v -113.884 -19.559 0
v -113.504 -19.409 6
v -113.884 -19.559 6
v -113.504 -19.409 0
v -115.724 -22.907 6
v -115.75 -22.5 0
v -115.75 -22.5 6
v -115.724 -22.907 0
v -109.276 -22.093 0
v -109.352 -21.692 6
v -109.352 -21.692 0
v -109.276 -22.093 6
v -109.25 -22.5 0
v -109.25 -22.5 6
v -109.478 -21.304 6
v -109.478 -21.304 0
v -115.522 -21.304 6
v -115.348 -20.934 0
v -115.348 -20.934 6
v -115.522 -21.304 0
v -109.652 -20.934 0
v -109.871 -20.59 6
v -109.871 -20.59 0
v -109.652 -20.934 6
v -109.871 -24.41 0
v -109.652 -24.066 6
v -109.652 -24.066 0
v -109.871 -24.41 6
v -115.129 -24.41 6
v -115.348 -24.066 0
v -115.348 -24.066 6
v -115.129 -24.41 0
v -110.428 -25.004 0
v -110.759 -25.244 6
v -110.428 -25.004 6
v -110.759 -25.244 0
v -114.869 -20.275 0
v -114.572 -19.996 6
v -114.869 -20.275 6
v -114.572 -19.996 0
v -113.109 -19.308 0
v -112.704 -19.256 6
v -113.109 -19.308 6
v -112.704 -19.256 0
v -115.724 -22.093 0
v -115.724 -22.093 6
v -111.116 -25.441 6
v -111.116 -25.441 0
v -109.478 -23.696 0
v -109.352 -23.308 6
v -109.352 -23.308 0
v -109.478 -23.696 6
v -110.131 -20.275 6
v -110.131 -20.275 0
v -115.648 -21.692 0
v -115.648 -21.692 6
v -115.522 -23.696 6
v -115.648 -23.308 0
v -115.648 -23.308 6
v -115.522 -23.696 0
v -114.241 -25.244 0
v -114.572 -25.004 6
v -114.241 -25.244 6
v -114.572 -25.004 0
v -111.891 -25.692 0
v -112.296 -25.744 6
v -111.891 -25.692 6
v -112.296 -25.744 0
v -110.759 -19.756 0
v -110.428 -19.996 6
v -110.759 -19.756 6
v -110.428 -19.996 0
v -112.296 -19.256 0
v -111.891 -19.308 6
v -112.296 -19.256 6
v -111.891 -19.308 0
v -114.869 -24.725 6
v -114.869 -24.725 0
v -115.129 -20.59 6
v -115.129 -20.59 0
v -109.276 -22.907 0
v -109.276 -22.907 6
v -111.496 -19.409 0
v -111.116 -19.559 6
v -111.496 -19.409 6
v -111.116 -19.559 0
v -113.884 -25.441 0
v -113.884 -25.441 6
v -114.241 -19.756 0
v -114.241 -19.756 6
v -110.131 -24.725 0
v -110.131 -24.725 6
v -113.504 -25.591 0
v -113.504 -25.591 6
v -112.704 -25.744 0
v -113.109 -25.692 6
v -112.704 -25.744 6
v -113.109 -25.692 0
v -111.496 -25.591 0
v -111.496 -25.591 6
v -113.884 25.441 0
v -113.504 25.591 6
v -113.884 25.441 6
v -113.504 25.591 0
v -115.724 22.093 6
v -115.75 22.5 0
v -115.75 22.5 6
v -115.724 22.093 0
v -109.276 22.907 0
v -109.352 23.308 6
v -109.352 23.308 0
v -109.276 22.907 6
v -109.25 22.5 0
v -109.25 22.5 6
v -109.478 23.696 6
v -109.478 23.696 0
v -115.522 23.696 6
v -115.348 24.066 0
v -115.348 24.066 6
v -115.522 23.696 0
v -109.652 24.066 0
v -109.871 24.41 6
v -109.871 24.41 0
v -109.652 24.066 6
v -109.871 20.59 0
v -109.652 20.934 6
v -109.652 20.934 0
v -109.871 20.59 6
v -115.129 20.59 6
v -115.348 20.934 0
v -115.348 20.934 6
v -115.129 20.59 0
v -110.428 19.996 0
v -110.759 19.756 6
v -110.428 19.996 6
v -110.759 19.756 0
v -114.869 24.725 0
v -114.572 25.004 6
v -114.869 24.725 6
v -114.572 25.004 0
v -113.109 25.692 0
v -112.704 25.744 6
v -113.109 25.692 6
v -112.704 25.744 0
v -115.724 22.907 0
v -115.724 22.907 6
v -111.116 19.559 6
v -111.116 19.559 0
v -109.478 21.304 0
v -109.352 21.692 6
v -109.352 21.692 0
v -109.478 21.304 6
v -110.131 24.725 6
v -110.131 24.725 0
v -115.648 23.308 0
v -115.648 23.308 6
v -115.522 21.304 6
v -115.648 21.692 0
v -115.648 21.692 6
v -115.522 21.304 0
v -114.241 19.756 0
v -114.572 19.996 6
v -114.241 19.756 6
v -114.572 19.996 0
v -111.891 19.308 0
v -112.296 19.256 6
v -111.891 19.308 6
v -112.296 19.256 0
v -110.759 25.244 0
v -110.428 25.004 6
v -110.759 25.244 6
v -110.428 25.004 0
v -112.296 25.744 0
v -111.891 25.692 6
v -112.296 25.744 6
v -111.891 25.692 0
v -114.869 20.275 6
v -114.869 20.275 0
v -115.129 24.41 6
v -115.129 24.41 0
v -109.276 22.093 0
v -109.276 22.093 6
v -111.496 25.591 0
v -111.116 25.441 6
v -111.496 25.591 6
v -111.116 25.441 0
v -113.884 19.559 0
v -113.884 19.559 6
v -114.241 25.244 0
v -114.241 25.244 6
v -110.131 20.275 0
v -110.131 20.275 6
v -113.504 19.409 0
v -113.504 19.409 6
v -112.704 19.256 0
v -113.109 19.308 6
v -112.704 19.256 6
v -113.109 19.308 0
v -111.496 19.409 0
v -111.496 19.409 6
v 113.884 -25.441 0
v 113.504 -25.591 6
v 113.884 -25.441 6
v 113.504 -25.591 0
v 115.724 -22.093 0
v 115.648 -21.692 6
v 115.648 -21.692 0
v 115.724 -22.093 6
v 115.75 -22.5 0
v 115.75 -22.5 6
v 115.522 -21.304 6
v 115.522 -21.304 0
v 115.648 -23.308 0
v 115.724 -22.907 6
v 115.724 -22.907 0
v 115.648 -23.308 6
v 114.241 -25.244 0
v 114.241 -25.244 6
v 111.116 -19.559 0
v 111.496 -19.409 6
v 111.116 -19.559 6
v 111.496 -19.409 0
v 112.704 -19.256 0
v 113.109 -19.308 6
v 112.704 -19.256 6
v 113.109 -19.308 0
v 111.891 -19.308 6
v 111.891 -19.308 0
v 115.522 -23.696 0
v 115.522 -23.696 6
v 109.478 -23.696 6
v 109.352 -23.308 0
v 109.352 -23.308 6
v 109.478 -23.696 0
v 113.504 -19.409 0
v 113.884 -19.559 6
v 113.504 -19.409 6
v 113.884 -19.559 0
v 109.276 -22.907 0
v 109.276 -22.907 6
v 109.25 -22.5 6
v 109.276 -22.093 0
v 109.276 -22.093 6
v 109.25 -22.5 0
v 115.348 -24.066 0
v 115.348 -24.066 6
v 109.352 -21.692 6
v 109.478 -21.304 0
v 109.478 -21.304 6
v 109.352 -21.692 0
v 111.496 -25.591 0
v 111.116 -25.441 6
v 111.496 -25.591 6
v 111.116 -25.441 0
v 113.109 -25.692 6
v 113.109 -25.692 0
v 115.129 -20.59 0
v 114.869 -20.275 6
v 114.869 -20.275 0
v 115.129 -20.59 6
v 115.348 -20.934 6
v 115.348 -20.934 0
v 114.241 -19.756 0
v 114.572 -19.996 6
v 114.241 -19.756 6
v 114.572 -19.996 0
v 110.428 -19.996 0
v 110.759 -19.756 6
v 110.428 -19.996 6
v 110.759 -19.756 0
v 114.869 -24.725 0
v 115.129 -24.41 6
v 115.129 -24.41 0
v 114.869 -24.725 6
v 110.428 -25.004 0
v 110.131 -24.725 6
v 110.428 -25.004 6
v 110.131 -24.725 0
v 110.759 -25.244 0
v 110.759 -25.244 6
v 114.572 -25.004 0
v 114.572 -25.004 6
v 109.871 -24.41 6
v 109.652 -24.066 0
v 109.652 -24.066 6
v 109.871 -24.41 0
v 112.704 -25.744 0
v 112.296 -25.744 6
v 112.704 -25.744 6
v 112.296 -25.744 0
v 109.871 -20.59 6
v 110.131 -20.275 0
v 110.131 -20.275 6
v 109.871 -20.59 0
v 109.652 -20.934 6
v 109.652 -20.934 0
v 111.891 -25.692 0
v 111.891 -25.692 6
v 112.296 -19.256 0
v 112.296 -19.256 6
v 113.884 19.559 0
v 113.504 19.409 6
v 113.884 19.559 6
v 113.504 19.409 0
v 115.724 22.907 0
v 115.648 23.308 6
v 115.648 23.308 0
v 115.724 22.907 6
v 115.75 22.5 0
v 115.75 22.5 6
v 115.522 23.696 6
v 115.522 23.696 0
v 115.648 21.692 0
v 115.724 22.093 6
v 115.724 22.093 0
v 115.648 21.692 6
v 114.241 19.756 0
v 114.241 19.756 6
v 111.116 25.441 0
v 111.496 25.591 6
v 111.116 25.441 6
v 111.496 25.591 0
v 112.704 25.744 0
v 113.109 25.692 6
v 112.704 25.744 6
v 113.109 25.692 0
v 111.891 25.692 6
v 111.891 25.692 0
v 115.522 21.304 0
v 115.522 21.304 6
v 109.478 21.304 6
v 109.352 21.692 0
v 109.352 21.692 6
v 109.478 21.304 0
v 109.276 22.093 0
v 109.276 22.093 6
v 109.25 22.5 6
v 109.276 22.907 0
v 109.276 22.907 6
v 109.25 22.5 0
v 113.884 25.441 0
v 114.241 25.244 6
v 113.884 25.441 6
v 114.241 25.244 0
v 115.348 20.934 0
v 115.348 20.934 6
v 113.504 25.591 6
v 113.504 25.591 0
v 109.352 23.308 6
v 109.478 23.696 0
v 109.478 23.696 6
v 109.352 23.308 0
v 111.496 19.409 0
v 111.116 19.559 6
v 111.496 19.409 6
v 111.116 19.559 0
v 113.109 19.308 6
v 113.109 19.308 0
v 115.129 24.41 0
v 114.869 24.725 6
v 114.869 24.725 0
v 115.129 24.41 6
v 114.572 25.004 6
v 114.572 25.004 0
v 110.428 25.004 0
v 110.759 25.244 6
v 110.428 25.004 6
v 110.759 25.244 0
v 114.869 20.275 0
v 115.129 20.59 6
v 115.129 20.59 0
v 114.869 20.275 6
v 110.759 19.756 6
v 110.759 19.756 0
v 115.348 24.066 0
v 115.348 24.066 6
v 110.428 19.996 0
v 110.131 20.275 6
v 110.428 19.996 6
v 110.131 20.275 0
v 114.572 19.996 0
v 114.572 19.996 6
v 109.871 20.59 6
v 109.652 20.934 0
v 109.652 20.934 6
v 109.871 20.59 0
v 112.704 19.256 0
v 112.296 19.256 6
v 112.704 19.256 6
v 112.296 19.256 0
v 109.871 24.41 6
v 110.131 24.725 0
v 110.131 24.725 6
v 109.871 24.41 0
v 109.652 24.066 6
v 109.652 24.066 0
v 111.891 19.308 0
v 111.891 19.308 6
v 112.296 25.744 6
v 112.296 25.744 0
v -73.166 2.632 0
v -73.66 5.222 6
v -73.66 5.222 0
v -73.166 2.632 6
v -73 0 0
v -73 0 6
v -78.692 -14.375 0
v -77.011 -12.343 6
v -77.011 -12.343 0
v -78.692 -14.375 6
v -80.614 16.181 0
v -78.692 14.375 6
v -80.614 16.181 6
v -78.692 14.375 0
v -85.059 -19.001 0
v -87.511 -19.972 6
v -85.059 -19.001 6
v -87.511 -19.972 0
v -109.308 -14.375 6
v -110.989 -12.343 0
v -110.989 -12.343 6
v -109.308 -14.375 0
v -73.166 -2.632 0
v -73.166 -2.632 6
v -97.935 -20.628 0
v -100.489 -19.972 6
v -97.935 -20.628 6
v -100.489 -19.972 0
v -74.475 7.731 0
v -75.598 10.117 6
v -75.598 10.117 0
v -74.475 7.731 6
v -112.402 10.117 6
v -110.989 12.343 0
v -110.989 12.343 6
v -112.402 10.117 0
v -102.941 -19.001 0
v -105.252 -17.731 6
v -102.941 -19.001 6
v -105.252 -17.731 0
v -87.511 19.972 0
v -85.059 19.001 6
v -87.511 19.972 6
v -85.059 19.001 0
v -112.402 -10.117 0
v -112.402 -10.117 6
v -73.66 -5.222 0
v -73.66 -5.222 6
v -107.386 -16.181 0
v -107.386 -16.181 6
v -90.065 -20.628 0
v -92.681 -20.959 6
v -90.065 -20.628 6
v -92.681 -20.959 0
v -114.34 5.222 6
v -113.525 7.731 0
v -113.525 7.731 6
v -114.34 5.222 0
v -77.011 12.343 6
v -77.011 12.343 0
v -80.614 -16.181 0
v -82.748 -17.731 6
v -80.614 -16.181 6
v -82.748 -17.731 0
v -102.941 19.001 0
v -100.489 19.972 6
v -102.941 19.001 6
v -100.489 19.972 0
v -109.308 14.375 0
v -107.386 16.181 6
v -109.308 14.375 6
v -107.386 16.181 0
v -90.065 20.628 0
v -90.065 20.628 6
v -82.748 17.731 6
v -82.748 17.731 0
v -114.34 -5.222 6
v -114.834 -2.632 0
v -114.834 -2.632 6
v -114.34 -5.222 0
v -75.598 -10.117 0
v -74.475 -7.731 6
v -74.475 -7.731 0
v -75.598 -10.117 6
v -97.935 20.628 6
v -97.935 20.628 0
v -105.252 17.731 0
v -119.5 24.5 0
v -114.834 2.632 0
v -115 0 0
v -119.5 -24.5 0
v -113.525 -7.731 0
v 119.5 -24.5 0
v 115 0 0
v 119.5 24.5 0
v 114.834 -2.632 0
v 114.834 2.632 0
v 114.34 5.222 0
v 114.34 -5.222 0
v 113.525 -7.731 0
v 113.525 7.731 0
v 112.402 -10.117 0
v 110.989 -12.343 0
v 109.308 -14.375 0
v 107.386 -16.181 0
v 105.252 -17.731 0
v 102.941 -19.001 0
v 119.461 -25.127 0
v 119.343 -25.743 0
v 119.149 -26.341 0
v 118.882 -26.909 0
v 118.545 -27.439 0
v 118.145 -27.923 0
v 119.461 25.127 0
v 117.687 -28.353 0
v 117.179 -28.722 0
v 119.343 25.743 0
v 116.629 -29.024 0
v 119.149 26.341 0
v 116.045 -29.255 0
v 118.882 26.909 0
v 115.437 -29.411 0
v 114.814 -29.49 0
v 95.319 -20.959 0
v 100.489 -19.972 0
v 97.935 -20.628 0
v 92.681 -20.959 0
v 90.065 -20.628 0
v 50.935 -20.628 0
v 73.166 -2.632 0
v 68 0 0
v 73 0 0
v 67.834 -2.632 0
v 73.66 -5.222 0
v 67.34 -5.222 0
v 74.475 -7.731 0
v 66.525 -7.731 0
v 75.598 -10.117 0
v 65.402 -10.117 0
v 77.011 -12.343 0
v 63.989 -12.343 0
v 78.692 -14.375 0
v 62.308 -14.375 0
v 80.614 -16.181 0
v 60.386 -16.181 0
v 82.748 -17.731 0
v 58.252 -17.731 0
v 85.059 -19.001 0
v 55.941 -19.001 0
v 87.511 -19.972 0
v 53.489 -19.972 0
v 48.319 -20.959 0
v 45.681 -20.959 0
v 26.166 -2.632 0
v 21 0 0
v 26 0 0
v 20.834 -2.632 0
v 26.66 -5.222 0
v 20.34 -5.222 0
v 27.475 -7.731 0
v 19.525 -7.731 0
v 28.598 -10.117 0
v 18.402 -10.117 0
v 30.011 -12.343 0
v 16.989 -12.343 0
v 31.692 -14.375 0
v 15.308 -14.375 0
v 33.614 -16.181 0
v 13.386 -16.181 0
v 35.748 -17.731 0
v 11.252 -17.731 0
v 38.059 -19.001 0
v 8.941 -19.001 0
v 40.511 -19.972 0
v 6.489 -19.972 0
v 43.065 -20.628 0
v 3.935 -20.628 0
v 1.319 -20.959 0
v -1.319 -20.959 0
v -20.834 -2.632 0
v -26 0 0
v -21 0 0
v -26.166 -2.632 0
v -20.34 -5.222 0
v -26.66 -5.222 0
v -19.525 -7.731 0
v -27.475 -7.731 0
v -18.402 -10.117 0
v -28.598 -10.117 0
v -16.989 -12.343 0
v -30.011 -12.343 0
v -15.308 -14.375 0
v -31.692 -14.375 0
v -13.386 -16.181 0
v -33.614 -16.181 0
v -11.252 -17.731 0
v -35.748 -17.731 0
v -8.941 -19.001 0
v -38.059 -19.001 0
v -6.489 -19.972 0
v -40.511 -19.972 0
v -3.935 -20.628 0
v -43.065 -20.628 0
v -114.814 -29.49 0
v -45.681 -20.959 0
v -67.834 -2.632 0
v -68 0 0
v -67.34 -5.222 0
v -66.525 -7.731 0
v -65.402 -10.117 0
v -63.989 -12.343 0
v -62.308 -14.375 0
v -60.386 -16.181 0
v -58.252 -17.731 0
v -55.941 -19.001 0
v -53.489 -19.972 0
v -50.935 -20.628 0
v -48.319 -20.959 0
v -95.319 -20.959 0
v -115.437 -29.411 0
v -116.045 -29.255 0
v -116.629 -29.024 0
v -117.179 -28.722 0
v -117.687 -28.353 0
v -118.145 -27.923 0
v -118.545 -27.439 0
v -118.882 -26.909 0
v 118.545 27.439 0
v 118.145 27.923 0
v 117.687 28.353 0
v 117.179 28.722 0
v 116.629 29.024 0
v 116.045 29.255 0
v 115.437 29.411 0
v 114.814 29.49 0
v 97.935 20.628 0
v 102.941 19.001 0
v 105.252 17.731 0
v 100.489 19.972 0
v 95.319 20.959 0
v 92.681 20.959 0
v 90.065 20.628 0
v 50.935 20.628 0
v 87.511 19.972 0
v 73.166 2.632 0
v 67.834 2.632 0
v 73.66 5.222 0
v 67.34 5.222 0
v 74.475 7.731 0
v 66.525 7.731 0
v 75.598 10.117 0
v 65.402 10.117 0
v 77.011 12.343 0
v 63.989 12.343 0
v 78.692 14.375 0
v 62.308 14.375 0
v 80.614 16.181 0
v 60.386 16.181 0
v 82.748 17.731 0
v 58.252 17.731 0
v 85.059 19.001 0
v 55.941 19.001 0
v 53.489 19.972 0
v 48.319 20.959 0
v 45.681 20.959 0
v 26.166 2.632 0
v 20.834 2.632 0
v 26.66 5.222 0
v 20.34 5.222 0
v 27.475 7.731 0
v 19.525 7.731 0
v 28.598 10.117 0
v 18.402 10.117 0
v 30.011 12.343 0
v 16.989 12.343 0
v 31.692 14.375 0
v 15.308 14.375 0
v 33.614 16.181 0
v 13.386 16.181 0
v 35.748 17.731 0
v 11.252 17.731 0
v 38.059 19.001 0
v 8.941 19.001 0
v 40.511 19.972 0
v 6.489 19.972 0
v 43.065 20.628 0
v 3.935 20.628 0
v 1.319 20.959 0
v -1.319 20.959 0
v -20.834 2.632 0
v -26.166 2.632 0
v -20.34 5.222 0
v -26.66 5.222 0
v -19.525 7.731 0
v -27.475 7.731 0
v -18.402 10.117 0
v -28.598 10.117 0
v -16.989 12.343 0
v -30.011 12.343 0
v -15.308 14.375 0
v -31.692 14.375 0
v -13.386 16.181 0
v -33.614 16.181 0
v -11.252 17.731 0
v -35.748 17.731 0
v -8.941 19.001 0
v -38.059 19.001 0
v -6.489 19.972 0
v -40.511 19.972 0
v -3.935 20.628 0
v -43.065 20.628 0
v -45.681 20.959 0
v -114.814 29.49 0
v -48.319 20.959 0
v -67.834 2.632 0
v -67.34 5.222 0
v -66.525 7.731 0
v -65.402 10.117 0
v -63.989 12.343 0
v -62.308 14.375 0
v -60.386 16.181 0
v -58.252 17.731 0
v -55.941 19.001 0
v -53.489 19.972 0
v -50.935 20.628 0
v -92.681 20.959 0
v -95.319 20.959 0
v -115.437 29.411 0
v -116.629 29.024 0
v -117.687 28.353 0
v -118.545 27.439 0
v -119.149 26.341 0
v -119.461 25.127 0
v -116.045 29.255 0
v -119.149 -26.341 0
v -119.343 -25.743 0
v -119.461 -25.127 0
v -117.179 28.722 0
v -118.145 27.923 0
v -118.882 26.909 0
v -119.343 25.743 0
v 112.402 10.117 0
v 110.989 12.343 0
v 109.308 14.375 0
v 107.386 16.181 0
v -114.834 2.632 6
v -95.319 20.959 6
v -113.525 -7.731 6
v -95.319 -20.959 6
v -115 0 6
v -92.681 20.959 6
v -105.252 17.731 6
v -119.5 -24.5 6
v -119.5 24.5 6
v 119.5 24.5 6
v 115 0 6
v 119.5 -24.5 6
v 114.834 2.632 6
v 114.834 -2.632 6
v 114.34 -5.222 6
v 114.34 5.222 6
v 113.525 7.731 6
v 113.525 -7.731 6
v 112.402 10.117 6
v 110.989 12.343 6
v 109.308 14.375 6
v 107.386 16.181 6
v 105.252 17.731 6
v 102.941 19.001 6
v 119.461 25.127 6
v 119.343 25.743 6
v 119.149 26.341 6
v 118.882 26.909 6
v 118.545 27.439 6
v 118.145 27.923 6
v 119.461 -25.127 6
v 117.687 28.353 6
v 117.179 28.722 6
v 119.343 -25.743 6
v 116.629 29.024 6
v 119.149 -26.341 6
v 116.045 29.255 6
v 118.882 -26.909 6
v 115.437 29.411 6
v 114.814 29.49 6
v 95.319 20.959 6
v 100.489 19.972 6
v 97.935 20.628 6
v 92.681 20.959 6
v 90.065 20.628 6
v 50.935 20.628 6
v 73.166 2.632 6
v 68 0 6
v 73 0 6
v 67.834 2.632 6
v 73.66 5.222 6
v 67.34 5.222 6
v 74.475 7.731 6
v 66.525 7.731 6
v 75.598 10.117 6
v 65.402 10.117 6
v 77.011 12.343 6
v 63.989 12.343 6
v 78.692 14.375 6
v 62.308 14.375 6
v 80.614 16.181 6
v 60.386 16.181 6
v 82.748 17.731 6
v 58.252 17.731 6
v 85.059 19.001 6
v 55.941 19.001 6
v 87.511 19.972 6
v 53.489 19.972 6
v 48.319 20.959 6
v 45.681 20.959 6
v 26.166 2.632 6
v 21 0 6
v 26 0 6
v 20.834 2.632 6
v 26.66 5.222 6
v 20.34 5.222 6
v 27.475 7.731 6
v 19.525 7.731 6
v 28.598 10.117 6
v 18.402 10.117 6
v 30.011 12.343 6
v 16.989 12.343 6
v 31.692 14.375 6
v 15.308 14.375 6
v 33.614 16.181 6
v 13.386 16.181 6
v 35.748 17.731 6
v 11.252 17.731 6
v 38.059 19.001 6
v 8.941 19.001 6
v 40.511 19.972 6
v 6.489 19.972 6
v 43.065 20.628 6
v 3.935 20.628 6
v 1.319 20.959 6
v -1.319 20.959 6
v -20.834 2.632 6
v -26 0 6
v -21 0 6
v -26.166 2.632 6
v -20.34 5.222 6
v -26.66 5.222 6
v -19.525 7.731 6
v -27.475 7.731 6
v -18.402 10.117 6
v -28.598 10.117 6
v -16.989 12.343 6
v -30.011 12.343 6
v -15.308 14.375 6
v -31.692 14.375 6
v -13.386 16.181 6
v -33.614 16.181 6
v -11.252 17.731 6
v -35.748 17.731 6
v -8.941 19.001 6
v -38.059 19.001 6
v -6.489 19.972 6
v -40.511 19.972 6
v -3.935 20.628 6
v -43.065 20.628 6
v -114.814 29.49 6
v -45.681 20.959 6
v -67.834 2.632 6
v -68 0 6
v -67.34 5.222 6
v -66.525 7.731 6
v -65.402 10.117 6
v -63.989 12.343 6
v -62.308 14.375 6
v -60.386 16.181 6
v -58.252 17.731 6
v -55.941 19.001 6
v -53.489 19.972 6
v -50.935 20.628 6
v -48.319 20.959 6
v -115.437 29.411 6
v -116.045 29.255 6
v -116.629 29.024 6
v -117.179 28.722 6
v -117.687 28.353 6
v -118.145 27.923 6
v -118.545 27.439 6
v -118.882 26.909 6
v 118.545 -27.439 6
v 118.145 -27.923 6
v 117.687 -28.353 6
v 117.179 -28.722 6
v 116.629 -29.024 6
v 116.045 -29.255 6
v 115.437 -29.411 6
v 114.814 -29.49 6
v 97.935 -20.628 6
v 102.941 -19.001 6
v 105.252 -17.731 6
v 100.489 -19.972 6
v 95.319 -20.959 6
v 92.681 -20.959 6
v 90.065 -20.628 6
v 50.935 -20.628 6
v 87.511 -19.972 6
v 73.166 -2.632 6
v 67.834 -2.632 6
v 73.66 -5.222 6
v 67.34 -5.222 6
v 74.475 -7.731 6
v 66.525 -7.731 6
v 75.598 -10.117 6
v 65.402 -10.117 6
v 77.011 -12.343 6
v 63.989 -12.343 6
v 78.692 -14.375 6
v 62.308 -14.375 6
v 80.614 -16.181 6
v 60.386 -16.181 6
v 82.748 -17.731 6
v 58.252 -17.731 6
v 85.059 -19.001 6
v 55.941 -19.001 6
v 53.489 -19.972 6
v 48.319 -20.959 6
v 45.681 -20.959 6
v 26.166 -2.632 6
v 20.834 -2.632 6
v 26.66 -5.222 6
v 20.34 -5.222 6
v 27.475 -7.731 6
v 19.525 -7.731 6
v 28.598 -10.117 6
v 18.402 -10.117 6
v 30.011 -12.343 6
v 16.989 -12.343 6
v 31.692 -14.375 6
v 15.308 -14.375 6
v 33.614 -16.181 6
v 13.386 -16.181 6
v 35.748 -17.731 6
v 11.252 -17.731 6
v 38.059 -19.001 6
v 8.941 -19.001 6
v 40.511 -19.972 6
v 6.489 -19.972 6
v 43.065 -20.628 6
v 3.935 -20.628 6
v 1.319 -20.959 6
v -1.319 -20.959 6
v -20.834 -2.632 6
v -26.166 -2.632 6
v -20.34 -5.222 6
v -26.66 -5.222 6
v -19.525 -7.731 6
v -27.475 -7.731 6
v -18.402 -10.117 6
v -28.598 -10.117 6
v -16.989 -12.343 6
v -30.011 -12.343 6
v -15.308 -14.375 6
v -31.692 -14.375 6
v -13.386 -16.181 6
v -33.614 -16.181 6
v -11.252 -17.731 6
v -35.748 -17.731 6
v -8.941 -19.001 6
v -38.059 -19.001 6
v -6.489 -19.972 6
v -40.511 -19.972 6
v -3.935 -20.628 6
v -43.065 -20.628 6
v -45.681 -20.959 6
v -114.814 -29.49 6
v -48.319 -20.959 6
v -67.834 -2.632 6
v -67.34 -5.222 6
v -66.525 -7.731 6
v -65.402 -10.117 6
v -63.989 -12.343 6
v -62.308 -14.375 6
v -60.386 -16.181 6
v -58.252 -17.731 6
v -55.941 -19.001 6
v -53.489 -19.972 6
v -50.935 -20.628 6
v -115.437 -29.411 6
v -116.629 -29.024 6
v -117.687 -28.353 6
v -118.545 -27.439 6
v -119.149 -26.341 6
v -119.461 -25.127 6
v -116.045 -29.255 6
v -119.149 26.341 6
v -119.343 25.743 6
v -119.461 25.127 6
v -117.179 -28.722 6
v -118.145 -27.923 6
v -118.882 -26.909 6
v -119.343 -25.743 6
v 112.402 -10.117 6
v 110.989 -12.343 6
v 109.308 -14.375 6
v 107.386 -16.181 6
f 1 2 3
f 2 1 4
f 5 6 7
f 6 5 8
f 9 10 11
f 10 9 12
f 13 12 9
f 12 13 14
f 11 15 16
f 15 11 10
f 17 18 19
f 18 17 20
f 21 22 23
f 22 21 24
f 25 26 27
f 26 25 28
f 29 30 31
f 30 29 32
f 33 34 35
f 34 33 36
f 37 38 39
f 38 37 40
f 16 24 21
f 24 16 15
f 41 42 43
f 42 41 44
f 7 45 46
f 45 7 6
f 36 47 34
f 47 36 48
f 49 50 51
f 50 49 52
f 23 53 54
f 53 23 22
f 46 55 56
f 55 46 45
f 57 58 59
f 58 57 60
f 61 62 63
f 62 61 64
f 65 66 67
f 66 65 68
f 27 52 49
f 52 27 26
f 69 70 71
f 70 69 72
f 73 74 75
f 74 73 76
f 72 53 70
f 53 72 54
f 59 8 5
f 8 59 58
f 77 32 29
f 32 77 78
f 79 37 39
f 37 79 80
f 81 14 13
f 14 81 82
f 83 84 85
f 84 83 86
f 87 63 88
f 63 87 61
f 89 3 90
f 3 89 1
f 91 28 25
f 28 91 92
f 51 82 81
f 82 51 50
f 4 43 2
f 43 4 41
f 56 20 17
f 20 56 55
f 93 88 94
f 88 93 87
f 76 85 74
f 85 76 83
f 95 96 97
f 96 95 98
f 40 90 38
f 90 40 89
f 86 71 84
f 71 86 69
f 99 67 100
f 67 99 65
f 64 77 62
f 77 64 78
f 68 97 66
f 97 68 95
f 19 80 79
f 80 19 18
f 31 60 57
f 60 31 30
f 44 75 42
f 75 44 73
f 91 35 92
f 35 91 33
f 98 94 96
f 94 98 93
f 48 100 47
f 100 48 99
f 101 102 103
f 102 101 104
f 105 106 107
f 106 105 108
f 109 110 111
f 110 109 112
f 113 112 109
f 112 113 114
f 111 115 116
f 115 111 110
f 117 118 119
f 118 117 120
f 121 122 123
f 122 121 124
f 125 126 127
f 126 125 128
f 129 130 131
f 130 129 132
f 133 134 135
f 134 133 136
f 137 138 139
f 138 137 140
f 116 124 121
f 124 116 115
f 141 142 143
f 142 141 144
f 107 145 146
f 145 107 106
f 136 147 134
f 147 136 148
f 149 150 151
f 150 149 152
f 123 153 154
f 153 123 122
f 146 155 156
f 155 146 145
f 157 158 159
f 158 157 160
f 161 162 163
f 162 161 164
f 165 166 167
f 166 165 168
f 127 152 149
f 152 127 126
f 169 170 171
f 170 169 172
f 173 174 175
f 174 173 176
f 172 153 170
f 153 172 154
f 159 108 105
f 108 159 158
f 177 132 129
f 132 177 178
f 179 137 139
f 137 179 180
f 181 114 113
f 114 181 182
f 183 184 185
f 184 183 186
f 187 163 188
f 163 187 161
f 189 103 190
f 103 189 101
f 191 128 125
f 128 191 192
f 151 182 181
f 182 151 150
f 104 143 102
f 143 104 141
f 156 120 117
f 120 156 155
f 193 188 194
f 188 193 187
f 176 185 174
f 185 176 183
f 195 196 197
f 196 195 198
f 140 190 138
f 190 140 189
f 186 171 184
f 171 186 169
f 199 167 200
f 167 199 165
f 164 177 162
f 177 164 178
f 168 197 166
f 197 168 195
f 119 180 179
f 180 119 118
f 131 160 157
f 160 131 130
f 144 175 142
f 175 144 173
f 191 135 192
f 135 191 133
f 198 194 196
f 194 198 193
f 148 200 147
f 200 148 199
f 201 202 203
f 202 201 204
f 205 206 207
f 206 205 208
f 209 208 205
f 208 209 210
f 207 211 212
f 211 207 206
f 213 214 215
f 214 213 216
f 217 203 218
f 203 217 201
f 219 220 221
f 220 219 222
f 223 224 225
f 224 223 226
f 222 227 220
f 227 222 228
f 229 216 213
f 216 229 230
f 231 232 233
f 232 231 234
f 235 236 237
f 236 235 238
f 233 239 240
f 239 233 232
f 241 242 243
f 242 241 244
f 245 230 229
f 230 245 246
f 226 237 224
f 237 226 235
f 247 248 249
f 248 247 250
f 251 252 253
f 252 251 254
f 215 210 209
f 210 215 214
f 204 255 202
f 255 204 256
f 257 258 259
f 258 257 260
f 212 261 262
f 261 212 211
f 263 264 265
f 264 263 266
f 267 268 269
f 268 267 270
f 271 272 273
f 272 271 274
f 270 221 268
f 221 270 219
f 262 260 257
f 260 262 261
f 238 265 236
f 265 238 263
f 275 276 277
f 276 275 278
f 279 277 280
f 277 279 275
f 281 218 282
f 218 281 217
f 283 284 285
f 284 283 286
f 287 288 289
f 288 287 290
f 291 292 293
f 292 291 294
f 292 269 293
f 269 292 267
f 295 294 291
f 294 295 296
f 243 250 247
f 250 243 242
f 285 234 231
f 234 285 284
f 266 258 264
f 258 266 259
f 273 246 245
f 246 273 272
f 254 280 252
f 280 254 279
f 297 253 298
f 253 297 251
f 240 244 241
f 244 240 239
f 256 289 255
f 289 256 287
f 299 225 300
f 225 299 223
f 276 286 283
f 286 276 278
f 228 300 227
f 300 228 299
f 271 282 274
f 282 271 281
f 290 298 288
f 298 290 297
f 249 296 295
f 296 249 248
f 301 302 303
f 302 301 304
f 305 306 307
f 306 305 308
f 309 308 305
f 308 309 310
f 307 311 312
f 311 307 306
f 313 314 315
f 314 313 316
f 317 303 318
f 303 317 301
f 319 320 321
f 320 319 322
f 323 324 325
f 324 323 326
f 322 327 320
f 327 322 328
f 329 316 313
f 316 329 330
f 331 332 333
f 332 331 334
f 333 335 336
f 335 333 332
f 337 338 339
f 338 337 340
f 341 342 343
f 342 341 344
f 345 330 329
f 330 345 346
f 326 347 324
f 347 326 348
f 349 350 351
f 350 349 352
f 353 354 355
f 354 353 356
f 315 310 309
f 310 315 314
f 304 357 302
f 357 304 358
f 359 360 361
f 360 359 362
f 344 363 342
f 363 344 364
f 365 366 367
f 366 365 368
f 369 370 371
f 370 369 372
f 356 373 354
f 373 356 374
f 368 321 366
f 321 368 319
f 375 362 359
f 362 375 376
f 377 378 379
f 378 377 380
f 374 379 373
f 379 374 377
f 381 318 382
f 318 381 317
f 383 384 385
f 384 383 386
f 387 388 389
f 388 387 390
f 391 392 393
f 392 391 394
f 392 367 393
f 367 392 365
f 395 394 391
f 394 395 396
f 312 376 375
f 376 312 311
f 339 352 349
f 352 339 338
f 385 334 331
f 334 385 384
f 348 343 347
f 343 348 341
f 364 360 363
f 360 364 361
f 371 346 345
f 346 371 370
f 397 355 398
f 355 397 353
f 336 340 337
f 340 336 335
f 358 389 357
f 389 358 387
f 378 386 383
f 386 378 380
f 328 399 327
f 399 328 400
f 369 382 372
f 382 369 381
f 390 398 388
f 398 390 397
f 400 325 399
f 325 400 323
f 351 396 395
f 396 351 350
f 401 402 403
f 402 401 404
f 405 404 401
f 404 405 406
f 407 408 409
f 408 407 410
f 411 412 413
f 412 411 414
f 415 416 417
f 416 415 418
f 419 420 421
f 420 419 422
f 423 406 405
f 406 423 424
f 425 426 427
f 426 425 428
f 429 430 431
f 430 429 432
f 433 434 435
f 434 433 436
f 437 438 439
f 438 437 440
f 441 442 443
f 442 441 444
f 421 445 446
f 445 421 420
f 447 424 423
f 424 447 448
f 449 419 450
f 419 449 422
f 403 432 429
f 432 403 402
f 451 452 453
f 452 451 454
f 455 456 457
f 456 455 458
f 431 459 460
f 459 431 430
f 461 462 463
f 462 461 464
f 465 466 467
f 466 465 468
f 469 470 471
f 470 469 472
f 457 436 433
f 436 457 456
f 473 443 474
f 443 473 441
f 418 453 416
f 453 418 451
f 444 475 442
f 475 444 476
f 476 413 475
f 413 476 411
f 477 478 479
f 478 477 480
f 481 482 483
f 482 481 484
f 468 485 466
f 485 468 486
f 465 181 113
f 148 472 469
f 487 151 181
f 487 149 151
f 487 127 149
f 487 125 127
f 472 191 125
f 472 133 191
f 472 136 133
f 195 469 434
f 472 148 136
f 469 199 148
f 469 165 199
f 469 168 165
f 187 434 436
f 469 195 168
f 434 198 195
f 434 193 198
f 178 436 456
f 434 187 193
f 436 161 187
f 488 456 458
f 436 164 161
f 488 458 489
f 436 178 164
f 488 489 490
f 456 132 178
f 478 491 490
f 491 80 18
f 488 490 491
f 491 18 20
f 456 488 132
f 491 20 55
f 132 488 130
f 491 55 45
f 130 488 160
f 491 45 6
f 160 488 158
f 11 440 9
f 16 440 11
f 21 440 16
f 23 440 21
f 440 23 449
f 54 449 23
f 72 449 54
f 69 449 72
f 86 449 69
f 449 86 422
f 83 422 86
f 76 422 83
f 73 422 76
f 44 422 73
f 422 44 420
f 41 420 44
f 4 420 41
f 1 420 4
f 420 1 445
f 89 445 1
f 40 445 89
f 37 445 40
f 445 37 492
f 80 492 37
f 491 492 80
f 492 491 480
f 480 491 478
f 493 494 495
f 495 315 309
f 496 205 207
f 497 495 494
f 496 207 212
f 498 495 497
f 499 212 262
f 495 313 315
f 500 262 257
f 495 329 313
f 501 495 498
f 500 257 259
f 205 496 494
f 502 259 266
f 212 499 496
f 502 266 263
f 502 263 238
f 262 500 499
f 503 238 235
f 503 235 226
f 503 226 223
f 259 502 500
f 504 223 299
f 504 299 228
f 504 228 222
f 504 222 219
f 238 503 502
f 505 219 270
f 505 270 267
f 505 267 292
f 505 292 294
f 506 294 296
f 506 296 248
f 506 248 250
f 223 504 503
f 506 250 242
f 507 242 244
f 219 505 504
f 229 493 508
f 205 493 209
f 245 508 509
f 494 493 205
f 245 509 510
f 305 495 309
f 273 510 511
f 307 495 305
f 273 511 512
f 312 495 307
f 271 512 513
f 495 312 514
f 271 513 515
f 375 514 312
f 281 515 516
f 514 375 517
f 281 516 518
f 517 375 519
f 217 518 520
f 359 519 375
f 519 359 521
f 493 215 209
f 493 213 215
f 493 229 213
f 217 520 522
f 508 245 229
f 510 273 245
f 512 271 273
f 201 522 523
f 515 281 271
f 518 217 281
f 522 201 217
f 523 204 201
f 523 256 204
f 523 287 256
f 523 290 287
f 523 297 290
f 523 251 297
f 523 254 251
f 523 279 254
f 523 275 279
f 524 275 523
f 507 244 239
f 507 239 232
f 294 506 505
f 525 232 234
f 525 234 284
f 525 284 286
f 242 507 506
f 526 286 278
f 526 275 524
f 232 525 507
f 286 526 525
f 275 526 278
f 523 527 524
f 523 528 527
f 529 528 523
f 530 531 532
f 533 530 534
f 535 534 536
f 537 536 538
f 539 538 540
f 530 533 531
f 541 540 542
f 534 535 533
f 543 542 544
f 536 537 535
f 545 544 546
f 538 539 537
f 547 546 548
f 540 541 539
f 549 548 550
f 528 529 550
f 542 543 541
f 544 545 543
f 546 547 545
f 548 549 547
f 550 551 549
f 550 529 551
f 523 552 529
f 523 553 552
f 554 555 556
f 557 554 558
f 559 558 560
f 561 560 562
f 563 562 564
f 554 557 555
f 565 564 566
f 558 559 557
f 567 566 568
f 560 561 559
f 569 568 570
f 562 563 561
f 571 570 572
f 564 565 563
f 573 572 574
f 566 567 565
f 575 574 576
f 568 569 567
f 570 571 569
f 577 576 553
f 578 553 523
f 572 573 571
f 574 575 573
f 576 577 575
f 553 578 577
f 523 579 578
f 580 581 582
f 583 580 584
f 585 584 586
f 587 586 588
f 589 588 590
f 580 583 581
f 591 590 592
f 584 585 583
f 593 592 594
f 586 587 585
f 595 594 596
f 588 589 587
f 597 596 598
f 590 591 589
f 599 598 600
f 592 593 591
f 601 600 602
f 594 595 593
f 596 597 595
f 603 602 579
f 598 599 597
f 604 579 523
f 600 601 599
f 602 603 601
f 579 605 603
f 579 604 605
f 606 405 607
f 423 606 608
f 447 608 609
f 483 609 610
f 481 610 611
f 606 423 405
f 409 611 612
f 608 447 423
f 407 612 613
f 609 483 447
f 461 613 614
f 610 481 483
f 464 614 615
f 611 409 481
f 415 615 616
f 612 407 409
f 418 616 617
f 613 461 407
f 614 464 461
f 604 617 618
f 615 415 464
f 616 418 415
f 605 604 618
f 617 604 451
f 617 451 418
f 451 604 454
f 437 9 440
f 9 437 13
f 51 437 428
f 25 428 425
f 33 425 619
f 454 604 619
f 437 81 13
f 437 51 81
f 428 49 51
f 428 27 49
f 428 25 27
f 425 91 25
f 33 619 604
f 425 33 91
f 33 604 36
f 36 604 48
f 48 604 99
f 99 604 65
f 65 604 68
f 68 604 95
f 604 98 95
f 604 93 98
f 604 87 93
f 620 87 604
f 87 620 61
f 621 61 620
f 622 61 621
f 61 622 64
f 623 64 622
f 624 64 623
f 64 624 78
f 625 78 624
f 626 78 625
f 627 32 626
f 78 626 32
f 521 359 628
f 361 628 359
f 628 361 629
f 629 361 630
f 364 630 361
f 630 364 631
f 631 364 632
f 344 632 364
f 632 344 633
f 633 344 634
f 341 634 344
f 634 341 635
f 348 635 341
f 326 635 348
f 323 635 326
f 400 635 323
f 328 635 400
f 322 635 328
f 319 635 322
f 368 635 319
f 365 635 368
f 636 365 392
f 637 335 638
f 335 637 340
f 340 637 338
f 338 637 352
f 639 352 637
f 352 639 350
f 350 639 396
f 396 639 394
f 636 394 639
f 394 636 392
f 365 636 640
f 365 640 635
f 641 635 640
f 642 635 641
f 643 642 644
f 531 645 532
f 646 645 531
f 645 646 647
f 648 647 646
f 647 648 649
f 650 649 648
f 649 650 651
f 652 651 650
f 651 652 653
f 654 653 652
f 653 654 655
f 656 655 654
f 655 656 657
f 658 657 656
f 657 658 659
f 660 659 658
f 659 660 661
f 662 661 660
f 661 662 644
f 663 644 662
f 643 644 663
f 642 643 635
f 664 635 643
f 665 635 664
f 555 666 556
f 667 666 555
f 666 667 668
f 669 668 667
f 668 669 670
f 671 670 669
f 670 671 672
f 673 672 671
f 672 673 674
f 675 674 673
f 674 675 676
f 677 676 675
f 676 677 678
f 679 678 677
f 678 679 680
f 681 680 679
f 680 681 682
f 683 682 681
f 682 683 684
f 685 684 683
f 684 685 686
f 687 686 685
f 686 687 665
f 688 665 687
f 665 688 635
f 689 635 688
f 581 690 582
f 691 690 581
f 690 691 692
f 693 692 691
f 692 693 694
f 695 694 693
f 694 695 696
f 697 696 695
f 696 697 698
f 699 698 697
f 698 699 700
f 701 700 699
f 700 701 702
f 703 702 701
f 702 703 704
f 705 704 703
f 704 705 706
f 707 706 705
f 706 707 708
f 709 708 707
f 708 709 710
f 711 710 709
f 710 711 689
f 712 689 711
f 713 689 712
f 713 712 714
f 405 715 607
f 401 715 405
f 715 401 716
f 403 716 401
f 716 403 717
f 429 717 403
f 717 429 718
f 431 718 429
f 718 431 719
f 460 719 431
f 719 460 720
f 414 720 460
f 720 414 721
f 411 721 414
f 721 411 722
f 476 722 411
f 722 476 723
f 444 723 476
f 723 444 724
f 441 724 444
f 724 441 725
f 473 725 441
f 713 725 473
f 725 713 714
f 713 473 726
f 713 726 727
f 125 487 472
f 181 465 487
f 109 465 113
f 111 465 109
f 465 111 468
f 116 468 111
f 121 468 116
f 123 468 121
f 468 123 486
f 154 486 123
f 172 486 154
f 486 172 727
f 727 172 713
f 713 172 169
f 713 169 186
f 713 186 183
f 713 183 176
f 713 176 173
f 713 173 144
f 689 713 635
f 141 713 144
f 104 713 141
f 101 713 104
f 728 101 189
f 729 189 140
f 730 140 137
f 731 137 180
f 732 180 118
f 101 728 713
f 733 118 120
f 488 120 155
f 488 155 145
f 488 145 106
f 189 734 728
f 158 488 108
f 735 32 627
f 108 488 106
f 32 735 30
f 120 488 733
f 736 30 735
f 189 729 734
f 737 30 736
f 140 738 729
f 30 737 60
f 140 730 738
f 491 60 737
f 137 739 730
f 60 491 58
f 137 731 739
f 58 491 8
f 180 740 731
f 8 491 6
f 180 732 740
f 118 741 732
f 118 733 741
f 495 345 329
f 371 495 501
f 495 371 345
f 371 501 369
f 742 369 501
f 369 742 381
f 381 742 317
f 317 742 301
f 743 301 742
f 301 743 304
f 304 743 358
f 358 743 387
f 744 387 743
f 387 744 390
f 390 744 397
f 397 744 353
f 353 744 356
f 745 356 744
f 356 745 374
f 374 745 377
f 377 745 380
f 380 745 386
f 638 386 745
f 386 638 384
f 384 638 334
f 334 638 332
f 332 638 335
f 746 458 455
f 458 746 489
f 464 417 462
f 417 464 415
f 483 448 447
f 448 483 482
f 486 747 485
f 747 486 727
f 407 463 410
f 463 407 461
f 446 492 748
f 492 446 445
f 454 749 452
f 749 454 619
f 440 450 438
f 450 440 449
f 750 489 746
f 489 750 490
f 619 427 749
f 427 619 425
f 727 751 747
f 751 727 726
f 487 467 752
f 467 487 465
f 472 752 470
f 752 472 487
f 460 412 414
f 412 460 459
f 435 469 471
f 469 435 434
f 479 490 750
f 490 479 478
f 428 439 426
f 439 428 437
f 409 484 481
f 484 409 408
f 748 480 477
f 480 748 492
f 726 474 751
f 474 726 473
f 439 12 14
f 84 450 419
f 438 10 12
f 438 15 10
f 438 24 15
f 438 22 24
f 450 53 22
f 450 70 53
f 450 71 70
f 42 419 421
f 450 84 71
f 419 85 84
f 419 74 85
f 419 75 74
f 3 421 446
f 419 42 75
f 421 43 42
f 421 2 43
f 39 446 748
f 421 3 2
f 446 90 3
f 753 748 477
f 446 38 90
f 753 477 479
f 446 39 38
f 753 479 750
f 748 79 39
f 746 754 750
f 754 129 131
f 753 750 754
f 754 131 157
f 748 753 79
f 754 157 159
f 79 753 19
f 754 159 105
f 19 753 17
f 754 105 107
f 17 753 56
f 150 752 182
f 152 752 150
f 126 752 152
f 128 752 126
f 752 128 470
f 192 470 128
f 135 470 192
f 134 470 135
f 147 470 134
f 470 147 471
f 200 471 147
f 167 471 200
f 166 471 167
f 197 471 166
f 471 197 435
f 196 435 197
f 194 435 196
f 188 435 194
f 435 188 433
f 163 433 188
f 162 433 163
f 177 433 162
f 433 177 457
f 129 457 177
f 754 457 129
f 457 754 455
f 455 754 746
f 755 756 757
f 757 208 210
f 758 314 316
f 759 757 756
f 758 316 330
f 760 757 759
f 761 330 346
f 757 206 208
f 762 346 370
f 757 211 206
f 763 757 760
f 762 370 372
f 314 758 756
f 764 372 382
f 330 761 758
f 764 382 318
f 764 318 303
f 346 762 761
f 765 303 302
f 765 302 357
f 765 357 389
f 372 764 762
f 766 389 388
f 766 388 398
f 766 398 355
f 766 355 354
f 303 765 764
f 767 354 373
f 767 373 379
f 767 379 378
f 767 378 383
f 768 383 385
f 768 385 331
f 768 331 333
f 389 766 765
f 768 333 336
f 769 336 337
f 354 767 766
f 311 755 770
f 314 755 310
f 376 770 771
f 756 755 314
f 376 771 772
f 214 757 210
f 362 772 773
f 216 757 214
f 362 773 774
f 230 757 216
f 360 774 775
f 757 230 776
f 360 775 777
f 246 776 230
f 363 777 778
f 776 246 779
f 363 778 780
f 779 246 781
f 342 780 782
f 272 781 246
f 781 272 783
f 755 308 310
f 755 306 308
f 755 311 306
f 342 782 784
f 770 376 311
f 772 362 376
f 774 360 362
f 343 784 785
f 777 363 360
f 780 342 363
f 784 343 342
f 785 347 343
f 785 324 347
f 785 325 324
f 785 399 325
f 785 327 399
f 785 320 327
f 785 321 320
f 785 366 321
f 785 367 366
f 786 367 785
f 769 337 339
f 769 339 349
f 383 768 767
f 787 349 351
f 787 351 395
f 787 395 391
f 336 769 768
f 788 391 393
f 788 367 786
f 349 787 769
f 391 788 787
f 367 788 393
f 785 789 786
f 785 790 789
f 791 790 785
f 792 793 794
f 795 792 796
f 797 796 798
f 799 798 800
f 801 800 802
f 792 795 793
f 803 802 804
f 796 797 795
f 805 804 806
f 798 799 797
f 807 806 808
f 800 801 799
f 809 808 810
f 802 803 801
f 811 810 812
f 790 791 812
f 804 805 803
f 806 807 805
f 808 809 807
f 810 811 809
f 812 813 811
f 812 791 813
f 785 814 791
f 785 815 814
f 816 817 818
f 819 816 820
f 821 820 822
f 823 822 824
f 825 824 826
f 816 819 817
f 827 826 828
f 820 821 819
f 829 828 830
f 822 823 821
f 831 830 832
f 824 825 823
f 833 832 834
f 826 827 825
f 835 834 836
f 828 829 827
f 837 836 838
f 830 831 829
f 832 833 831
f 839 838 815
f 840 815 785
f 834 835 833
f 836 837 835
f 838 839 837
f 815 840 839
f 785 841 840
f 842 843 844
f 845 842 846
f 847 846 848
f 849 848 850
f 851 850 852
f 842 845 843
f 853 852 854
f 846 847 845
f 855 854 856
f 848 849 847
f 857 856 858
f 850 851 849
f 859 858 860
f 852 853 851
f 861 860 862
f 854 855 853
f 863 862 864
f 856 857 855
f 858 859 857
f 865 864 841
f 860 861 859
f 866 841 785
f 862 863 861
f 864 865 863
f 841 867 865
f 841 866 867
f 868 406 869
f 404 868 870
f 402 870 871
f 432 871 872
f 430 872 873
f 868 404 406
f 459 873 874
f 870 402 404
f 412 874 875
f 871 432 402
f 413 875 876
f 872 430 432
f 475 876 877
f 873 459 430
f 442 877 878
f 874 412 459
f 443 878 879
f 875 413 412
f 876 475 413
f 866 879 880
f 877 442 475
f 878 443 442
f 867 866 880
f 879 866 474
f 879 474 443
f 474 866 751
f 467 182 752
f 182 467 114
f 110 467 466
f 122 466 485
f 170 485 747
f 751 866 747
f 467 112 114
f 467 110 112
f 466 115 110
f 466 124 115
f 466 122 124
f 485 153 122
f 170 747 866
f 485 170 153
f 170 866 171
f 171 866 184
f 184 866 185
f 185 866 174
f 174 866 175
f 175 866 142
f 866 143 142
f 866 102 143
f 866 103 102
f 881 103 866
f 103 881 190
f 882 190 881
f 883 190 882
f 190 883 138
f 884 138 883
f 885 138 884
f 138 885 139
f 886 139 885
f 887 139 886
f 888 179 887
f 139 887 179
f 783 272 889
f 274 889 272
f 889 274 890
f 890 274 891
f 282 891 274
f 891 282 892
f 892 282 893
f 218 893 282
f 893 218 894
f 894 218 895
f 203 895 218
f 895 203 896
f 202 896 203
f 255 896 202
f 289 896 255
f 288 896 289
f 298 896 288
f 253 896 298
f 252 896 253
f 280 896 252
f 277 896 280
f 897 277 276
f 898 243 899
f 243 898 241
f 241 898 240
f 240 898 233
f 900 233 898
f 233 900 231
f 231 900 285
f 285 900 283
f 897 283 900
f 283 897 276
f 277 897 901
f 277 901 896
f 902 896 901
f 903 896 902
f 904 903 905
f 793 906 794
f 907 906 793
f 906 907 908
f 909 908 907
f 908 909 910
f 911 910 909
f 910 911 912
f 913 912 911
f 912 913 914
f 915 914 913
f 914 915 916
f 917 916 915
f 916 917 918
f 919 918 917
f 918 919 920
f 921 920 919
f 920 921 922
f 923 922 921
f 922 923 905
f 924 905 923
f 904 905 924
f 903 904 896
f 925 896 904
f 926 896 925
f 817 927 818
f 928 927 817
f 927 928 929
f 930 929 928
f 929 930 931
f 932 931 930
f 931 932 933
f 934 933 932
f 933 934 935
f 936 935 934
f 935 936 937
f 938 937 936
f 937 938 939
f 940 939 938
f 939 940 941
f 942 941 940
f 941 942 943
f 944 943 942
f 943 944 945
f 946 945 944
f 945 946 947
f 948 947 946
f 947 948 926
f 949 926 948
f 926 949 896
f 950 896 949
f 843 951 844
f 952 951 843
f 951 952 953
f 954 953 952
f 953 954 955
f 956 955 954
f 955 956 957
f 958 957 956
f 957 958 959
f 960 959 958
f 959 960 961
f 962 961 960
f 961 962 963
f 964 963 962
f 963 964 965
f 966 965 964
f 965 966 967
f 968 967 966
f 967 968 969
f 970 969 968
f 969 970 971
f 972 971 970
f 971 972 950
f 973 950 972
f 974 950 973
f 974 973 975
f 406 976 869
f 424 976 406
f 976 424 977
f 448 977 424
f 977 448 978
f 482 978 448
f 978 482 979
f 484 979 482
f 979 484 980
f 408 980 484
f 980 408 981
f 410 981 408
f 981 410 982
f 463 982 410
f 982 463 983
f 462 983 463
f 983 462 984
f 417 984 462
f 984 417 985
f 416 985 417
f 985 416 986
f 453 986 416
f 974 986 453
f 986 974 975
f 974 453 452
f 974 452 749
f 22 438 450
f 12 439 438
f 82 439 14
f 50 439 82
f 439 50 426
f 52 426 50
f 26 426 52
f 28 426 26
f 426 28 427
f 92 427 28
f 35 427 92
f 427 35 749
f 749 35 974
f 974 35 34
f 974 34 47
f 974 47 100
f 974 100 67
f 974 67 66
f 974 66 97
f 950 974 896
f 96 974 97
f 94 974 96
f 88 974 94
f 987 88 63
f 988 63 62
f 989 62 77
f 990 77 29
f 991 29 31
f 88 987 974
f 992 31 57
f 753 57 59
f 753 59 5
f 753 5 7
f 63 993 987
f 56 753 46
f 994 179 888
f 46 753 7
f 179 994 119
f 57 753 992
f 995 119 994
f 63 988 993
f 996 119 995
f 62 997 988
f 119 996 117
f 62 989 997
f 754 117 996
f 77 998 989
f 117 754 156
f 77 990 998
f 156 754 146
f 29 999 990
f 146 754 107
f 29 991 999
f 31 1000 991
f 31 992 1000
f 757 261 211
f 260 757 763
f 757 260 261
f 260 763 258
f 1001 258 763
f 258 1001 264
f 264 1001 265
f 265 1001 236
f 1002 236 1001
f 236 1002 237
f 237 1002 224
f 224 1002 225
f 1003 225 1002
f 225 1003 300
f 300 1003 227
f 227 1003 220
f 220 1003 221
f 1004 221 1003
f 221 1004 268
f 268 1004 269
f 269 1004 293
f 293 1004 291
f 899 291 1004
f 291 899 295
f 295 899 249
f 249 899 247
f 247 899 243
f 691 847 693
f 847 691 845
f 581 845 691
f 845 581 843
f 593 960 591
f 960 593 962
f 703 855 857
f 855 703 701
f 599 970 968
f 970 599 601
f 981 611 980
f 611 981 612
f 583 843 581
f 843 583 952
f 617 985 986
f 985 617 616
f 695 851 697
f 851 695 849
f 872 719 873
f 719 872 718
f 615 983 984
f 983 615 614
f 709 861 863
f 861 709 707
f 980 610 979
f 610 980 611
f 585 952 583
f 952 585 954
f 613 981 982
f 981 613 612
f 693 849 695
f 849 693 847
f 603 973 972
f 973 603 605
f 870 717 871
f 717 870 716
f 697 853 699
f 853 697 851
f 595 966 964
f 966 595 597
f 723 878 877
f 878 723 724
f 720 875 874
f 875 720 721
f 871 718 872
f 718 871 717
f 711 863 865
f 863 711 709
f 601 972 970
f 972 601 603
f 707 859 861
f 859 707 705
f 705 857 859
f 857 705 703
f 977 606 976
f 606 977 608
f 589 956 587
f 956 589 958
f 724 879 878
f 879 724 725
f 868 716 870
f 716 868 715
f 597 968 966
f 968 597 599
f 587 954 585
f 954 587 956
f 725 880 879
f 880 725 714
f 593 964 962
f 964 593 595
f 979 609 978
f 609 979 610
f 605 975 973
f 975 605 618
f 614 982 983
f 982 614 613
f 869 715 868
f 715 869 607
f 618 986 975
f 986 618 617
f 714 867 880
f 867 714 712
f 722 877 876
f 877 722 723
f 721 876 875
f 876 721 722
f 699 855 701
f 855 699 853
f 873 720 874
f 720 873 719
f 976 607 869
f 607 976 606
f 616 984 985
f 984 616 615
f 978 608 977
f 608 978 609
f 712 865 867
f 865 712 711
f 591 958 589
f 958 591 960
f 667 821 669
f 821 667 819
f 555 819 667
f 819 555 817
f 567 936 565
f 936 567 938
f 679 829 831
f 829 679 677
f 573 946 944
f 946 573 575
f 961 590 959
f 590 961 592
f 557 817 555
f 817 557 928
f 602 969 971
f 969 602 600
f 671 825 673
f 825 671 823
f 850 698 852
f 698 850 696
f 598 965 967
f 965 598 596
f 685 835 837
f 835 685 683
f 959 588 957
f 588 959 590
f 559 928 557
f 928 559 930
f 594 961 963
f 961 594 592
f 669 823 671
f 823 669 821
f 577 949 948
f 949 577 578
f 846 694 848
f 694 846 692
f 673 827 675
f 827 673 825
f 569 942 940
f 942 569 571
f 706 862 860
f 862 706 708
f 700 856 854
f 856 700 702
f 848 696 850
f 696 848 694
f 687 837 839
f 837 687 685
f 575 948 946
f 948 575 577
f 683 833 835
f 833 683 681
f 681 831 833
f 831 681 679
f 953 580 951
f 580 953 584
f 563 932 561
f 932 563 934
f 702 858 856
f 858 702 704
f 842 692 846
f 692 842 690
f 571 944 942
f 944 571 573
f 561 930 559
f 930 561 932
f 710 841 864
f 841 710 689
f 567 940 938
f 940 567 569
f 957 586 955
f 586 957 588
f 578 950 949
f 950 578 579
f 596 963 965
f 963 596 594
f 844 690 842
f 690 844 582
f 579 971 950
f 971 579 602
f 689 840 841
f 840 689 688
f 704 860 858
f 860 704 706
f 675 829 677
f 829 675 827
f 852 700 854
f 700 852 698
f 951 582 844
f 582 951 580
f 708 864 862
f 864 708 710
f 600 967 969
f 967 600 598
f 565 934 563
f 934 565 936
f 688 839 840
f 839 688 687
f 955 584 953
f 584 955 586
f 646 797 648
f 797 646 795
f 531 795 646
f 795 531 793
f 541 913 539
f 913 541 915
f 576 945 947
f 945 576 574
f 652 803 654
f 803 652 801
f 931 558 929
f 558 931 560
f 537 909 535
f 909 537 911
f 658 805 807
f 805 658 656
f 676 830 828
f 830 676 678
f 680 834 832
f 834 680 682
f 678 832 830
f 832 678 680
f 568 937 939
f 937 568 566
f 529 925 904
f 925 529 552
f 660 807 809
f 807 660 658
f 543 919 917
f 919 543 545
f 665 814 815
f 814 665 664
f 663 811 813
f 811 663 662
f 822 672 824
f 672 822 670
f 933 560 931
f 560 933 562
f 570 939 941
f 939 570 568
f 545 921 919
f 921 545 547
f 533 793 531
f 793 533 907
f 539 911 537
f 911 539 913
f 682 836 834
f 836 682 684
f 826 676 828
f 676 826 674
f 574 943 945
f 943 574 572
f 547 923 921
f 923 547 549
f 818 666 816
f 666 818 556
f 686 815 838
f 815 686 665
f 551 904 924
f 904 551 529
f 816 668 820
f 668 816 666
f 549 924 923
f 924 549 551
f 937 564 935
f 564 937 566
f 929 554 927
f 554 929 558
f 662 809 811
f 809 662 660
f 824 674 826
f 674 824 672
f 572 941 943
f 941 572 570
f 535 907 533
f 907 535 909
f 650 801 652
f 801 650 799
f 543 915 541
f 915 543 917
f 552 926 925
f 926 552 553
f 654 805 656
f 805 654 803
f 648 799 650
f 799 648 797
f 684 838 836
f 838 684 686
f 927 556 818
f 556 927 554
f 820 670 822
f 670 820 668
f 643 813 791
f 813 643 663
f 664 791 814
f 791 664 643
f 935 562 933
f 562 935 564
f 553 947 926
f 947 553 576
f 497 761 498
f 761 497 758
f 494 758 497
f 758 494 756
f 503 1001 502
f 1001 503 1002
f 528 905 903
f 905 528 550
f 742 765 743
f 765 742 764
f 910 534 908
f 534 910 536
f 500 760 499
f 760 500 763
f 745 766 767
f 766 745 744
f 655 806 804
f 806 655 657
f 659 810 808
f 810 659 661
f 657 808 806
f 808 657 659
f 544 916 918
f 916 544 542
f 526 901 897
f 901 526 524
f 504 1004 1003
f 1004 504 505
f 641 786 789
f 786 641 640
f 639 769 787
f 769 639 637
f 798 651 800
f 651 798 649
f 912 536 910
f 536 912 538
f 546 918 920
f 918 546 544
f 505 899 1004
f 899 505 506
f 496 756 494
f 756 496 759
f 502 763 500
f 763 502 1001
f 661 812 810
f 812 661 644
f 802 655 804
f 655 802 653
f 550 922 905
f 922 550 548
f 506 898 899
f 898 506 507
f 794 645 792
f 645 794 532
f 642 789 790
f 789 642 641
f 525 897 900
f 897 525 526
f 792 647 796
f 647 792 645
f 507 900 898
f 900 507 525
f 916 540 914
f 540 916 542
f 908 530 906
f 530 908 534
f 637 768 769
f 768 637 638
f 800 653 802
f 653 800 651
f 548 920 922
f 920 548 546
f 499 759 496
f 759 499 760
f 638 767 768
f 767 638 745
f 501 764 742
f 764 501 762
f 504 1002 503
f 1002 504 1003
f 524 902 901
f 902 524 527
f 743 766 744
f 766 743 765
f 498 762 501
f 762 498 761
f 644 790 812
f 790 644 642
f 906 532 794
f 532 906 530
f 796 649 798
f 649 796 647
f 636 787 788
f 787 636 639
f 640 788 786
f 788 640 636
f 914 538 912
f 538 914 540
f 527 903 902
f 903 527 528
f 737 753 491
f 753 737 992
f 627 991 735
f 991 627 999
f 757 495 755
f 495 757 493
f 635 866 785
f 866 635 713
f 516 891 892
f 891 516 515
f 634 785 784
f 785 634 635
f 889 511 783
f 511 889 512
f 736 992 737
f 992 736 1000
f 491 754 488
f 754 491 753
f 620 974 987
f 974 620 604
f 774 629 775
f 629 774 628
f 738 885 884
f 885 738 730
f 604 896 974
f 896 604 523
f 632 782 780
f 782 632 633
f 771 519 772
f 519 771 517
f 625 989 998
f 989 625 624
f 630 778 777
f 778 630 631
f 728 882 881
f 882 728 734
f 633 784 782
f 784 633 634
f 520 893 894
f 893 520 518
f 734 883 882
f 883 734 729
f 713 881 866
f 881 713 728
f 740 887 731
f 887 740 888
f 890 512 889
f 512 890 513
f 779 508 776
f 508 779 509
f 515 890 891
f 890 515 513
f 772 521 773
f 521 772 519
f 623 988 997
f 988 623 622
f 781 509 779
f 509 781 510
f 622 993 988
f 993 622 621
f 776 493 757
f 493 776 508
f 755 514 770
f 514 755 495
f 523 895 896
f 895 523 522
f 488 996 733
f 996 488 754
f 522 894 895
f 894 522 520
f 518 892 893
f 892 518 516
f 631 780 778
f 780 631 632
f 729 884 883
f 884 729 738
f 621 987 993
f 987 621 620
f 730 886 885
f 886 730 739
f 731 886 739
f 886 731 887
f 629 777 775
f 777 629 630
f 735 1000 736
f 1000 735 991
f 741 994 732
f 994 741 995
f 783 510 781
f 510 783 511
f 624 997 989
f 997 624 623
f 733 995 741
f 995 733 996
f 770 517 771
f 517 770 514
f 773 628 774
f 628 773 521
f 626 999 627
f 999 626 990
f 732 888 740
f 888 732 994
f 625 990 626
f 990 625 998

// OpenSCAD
$fn = 50;


difference() {
	union() {
		hull() {
			translate(v = [-114.5000000000, 24.5000000000, 0]) {
				cylinder(h = 6, r = 5);
			}
			translate(v = [114.5000000000, 24.5000000000, 0]) {
				cylinder(h = 6, r = 5);
			}
			translate(v = [-114.5000000000, -24.5000000000, 0]) {
				cylinder(h = 6, r = 5);
			}
			translate(v = [114.5000000000, -24.5000000000, 0]) {
				cylinder(h = 6, r = 5);
			}
		}
	}
	union() {
		#translate(v = [-112.5000000000, -22.5000000000, -100.0000000000]) {
			cylinder(h = 200, r = 3.2500000000);
		}
		#translate(v = [-112.5000000000, 22.5000000000, -100.0000000000]) {
			cylinder(h = 200, r = 3.2500000000);
		}
		#translate(v = [112.5000000000, -22.5000000000, -100.0000000000]) {
			cylinder(h = 200, r = 3.2500000000);
		}
		#translate(v = [112.5000000000, 22.5000000000, -100.0000000000]) {
			cylinder(h = 200, r = 3.2500000000);
		}
		#translate(v = [-94.0000000000, 0, 0]) {
			cylinder(h = 6, r = 21.0000000000);
		}
		#translate(v = [-47.0000000000, 0, 0]) {
			cylinder(h = 6, r = 21.0000000000);
		}
		#cylinder(h = 6, r = 21.0000000000);
		#translate(v = [47.0000000000, 0, 0]) {
			cylinder(h = 6, r = 21.0000000000);
		}
		#translate(v = [94.0000000000, 0, 0]) {
			cylinder(h = 6, r = 21.0000000000);
		}
	}
}
